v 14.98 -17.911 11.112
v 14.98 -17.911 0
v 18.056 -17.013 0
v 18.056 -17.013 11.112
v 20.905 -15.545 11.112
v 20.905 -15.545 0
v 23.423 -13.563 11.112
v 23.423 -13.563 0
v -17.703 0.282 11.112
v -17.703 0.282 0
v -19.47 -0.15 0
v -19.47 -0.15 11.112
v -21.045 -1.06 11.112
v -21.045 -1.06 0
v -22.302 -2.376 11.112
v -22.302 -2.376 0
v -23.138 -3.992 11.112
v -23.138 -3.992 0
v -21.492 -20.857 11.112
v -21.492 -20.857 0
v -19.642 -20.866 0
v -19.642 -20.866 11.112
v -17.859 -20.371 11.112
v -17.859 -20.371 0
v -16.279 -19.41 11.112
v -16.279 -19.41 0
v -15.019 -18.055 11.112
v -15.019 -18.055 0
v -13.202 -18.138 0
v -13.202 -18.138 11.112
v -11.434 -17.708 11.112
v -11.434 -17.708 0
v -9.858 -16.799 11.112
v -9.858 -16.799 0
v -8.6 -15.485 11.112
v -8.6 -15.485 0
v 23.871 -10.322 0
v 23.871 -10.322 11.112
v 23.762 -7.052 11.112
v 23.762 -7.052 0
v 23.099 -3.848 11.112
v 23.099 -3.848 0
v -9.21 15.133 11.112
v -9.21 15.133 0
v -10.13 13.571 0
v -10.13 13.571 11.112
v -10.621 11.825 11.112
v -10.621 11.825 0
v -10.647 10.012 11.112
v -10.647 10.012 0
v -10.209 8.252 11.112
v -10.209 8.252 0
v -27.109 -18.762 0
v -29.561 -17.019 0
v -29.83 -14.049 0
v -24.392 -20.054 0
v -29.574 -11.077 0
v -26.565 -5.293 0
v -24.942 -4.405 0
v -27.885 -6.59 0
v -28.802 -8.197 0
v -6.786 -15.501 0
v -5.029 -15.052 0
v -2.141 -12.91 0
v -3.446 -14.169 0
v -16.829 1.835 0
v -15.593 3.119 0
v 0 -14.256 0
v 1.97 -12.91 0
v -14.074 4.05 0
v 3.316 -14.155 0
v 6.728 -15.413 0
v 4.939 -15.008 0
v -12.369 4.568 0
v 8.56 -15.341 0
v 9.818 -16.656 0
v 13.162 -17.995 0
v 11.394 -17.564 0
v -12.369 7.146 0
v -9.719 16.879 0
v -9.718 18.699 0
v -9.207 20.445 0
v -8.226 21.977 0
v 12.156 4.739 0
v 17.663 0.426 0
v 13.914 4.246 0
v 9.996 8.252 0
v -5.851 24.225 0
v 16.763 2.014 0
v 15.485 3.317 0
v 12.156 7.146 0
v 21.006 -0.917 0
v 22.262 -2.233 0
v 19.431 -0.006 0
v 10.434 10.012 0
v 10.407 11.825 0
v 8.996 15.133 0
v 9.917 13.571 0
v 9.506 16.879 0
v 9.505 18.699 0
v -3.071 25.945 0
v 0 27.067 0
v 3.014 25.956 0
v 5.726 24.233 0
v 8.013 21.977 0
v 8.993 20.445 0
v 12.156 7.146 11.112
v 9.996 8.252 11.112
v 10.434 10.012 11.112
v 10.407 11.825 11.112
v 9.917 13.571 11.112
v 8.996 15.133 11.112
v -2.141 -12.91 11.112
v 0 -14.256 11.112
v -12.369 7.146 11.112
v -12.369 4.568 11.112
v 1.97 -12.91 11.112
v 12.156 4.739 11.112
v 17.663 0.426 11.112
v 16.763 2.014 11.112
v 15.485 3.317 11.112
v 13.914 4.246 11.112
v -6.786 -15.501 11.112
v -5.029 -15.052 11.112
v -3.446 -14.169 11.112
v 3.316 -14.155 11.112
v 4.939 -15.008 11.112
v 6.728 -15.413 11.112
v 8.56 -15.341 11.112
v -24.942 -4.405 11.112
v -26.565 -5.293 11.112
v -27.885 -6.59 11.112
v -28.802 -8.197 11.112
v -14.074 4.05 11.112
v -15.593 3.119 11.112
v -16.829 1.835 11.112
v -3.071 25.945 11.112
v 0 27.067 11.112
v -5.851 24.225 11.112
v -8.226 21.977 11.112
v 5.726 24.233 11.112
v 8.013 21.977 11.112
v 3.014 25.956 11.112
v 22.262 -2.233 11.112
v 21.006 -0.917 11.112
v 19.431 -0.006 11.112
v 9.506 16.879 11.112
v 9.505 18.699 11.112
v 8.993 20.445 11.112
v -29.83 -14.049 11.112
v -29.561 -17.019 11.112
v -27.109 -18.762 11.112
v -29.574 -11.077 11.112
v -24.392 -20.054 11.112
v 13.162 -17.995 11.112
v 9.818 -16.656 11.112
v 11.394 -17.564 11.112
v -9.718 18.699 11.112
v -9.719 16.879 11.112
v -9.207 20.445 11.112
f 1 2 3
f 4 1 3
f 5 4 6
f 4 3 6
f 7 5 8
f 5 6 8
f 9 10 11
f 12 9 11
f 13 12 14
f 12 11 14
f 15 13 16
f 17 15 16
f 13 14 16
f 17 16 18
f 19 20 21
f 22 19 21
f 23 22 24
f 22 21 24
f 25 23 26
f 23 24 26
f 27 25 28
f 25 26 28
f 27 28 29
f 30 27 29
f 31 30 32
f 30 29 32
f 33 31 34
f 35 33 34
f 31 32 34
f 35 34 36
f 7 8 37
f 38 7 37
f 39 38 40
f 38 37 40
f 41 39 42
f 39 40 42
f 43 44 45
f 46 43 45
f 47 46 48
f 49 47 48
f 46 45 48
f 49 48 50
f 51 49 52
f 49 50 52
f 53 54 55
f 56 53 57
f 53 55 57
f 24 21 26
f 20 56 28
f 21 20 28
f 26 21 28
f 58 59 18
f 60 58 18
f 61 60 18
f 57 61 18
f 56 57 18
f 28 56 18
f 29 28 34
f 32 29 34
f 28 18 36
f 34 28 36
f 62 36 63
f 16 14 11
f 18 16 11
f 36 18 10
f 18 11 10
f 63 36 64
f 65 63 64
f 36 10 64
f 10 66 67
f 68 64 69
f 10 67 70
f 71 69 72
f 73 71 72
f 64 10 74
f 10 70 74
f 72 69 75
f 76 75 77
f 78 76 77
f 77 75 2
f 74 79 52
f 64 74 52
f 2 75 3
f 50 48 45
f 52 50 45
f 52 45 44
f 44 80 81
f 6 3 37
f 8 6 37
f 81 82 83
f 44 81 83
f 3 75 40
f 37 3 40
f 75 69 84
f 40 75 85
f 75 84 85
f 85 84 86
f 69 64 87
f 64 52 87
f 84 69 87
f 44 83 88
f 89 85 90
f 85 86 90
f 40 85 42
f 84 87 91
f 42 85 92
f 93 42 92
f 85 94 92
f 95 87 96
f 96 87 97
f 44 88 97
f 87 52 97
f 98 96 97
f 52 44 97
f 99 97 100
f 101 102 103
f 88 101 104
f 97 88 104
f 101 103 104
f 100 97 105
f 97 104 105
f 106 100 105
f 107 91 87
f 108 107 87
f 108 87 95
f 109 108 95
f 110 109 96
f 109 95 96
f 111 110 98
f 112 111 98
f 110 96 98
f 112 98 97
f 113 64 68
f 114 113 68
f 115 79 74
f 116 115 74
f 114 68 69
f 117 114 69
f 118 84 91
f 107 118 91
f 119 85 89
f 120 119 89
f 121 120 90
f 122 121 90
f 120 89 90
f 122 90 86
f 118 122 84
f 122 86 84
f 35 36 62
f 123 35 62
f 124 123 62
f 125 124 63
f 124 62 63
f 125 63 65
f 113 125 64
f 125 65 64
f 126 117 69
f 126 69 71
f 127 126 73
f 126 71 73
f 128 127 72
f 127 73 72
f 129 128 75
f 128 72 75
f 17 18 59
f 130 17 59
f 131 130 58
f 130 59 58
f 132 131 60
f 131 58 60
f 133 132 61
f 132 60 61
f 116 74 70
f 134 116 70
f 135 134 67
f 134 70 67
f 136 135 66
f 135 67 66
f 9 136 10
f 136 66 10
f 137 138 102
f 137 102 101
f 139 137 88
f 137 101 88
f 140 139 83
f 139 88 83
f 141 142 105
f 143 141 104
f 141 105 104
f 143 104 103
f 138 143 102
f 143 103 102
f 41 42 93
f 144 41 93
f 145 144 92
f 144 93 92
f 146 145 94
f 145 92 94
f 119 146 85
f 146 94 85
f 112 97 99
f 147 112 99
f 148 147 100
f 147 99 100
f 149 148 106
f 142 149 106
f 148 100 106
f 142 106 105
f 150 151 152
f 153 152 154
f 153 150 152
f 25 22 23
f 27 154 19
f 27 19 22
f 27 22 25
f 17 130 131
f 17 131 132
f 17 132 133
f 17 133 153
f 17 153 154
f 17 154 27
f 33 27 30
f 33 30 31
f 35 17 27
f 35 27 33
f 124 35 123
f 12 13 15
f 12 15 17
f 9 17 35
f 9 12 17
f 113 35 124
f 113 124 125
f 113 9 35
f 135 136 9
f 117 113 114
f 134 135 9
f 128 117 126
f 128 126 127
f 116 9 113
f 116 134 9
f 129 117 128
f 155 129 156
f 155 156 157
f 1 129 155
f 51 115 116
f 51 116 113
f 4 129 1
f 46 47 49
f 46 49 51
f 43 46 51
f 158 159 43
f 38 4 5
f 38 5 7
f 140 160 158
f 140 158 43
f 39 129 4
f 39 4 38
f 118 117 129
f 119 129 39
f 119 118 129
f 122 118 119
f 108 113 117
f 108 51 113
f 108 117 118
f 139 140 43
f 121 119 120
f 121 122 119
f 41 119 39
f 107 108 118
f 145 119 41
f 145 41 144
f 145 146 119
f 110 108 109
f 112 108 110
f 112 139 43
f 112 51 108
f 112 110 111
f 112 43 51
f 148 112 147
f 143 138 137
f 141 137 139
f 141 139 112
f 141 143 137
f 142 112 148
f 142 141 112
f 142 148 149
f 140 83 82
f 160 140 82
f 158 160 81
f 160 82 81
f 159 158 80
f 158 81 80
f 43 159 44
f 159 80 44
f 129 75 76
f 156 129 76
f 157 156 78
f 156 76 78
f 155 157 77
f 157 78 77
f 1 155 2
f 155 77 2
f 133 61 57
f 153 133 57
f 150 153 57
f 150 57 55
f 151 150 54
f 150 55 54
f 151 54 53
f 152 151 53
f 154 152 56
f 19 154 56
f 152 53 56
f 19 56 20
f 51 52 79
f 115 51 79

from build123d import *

# Parameters (mm, degrees)
F1_DEPTH = 11.1125


# Not quite as in the source:
# - a length typed as a fraction of an inch, garbled in the dataset ("3 / 203.2 mm" for 3/8 in), is restored


with BuildPart() as f1:
    # F0 (on Top) → F1 (new body)
    with BuildSketch(Plane.XY):
        with BuildLine():
            ThreePointArc((0, 27.0671695471), (-4.5048536548, 25.1556778504), (-8.2258973271, 21.977417171))
            ThreePointArc((-8.2258973271, 21.977417171), (-9.7181261566, 18.698842434), (-9.2097157612, 15.1327075437))
            ThreePointArc((-9.2097157612, 15.1327075437), (-10.6205392688, 11.8246856933), (-10.2093555033, 8.2519613206))
            Line((-10.2093555033, 8.2519613206), (-12.369341217, 7.1464567445))
            Line((-12.369341217, 7.1464567445), (-12.369341217, 4.6386048198))
            Line((-12.369341217, 4.6386048198), (-12.369341217, 4.5682978211))
            ThreePointArc((-12.369341217, 4.5682978211), (-15.5930977879, 3.1185654947), (-17.7027139134, 0.2823972963))
            ThreePointArc((-17.7027139134, 0.2823972963), (-21.0452825194, -1.0603738309), (-23.1384971151, -3.9919692741))
            ThreePointArc((-23.1384971151, -3.9919692741), (-26.5647165348, -5.2934051439), (-28.80180468, -8.19653302))
            ThreePointArc((-28.80180468, -8.19653302), (-29.7673344436, -12.5572908836), (-29.5614041388, -17.0189104974))
            ThreePointArc((-29.5614041388, -17.0189104974), (-25.7783661022, -19.4669407743), (-21.4921734029, -20.8571857766))
            ThreePointArc((-21.4921734029, -20.8571857766), (-17.8594468391, -20.3713745504), (-15.0192606046, -18.054899429))
            ThreePointArc((-15.0192606046, -18.054899429), (-11.4338171794, -17.7079201351), (-8.5996589687, -15.484556372))
            ThreePointArc((-8.5996589687, -15.484556372), (-5.0294162563, -15.0523544446), (-2.1409380715, -12.9098966718))
            Line((-2.1409380715, -12.9098966718), (0, -14.2561570176))
            Line((0, -14.2561570176), (1.9696742658, -12.9098966718))
            ThreePointArc((1.9696742658, -12.9098966718), (4.9392756736, -15.0084468105), (8.560301624, -15.3410370587))
            ThreePointArc((8.560301624, -15.3410370587), (11.3944598347, -17.5644008218), (14.9799032599, -17.9113801157))
            ThreePointArc((14.9799032599, -17.9113801157), (19.5156578324, -16.3470620723), (23.423301056, -13.563092798))
            ThreePointArc((23.423301056, -13.563092798), (23.8861103651, -8.6849198531), (23.0991397704, -3.8484499608))
            ThreePointArc((23.0991397704, -3.8484499608), (21.0059251747, -0.9168545176), (17.6633565687, 0.4259166096))
            ThreePointArc((17.6633565687, 0.4259166096), (15.4847616458, 3.3168082822), (12.1560195839, 4.739132713))
            Line((12.1560195839, 4.739132713), (12.1560195839, 7.1464567445))
            Line((12.1560195839, 7.1464567445), (9.9960338703, 8.2519613206))
            ThreePointArc((9.9960338703, 8.2519613206), (10.4072176357, 11.8246856933), (8.9963941282, 15.1327075437))
            ThreePointArc((8.9963941282, 15.1327075437), (9.5048045235, 18.698842434), (8.012575694, 21.977417171))
            ThreePointArc((8.012575694, 21.977417171), (4.4155385291, 25.1665589), (0, 27.0671695471))
        make_face()
    extrude(amount=F1_DEPTH)


solid = f1.part
